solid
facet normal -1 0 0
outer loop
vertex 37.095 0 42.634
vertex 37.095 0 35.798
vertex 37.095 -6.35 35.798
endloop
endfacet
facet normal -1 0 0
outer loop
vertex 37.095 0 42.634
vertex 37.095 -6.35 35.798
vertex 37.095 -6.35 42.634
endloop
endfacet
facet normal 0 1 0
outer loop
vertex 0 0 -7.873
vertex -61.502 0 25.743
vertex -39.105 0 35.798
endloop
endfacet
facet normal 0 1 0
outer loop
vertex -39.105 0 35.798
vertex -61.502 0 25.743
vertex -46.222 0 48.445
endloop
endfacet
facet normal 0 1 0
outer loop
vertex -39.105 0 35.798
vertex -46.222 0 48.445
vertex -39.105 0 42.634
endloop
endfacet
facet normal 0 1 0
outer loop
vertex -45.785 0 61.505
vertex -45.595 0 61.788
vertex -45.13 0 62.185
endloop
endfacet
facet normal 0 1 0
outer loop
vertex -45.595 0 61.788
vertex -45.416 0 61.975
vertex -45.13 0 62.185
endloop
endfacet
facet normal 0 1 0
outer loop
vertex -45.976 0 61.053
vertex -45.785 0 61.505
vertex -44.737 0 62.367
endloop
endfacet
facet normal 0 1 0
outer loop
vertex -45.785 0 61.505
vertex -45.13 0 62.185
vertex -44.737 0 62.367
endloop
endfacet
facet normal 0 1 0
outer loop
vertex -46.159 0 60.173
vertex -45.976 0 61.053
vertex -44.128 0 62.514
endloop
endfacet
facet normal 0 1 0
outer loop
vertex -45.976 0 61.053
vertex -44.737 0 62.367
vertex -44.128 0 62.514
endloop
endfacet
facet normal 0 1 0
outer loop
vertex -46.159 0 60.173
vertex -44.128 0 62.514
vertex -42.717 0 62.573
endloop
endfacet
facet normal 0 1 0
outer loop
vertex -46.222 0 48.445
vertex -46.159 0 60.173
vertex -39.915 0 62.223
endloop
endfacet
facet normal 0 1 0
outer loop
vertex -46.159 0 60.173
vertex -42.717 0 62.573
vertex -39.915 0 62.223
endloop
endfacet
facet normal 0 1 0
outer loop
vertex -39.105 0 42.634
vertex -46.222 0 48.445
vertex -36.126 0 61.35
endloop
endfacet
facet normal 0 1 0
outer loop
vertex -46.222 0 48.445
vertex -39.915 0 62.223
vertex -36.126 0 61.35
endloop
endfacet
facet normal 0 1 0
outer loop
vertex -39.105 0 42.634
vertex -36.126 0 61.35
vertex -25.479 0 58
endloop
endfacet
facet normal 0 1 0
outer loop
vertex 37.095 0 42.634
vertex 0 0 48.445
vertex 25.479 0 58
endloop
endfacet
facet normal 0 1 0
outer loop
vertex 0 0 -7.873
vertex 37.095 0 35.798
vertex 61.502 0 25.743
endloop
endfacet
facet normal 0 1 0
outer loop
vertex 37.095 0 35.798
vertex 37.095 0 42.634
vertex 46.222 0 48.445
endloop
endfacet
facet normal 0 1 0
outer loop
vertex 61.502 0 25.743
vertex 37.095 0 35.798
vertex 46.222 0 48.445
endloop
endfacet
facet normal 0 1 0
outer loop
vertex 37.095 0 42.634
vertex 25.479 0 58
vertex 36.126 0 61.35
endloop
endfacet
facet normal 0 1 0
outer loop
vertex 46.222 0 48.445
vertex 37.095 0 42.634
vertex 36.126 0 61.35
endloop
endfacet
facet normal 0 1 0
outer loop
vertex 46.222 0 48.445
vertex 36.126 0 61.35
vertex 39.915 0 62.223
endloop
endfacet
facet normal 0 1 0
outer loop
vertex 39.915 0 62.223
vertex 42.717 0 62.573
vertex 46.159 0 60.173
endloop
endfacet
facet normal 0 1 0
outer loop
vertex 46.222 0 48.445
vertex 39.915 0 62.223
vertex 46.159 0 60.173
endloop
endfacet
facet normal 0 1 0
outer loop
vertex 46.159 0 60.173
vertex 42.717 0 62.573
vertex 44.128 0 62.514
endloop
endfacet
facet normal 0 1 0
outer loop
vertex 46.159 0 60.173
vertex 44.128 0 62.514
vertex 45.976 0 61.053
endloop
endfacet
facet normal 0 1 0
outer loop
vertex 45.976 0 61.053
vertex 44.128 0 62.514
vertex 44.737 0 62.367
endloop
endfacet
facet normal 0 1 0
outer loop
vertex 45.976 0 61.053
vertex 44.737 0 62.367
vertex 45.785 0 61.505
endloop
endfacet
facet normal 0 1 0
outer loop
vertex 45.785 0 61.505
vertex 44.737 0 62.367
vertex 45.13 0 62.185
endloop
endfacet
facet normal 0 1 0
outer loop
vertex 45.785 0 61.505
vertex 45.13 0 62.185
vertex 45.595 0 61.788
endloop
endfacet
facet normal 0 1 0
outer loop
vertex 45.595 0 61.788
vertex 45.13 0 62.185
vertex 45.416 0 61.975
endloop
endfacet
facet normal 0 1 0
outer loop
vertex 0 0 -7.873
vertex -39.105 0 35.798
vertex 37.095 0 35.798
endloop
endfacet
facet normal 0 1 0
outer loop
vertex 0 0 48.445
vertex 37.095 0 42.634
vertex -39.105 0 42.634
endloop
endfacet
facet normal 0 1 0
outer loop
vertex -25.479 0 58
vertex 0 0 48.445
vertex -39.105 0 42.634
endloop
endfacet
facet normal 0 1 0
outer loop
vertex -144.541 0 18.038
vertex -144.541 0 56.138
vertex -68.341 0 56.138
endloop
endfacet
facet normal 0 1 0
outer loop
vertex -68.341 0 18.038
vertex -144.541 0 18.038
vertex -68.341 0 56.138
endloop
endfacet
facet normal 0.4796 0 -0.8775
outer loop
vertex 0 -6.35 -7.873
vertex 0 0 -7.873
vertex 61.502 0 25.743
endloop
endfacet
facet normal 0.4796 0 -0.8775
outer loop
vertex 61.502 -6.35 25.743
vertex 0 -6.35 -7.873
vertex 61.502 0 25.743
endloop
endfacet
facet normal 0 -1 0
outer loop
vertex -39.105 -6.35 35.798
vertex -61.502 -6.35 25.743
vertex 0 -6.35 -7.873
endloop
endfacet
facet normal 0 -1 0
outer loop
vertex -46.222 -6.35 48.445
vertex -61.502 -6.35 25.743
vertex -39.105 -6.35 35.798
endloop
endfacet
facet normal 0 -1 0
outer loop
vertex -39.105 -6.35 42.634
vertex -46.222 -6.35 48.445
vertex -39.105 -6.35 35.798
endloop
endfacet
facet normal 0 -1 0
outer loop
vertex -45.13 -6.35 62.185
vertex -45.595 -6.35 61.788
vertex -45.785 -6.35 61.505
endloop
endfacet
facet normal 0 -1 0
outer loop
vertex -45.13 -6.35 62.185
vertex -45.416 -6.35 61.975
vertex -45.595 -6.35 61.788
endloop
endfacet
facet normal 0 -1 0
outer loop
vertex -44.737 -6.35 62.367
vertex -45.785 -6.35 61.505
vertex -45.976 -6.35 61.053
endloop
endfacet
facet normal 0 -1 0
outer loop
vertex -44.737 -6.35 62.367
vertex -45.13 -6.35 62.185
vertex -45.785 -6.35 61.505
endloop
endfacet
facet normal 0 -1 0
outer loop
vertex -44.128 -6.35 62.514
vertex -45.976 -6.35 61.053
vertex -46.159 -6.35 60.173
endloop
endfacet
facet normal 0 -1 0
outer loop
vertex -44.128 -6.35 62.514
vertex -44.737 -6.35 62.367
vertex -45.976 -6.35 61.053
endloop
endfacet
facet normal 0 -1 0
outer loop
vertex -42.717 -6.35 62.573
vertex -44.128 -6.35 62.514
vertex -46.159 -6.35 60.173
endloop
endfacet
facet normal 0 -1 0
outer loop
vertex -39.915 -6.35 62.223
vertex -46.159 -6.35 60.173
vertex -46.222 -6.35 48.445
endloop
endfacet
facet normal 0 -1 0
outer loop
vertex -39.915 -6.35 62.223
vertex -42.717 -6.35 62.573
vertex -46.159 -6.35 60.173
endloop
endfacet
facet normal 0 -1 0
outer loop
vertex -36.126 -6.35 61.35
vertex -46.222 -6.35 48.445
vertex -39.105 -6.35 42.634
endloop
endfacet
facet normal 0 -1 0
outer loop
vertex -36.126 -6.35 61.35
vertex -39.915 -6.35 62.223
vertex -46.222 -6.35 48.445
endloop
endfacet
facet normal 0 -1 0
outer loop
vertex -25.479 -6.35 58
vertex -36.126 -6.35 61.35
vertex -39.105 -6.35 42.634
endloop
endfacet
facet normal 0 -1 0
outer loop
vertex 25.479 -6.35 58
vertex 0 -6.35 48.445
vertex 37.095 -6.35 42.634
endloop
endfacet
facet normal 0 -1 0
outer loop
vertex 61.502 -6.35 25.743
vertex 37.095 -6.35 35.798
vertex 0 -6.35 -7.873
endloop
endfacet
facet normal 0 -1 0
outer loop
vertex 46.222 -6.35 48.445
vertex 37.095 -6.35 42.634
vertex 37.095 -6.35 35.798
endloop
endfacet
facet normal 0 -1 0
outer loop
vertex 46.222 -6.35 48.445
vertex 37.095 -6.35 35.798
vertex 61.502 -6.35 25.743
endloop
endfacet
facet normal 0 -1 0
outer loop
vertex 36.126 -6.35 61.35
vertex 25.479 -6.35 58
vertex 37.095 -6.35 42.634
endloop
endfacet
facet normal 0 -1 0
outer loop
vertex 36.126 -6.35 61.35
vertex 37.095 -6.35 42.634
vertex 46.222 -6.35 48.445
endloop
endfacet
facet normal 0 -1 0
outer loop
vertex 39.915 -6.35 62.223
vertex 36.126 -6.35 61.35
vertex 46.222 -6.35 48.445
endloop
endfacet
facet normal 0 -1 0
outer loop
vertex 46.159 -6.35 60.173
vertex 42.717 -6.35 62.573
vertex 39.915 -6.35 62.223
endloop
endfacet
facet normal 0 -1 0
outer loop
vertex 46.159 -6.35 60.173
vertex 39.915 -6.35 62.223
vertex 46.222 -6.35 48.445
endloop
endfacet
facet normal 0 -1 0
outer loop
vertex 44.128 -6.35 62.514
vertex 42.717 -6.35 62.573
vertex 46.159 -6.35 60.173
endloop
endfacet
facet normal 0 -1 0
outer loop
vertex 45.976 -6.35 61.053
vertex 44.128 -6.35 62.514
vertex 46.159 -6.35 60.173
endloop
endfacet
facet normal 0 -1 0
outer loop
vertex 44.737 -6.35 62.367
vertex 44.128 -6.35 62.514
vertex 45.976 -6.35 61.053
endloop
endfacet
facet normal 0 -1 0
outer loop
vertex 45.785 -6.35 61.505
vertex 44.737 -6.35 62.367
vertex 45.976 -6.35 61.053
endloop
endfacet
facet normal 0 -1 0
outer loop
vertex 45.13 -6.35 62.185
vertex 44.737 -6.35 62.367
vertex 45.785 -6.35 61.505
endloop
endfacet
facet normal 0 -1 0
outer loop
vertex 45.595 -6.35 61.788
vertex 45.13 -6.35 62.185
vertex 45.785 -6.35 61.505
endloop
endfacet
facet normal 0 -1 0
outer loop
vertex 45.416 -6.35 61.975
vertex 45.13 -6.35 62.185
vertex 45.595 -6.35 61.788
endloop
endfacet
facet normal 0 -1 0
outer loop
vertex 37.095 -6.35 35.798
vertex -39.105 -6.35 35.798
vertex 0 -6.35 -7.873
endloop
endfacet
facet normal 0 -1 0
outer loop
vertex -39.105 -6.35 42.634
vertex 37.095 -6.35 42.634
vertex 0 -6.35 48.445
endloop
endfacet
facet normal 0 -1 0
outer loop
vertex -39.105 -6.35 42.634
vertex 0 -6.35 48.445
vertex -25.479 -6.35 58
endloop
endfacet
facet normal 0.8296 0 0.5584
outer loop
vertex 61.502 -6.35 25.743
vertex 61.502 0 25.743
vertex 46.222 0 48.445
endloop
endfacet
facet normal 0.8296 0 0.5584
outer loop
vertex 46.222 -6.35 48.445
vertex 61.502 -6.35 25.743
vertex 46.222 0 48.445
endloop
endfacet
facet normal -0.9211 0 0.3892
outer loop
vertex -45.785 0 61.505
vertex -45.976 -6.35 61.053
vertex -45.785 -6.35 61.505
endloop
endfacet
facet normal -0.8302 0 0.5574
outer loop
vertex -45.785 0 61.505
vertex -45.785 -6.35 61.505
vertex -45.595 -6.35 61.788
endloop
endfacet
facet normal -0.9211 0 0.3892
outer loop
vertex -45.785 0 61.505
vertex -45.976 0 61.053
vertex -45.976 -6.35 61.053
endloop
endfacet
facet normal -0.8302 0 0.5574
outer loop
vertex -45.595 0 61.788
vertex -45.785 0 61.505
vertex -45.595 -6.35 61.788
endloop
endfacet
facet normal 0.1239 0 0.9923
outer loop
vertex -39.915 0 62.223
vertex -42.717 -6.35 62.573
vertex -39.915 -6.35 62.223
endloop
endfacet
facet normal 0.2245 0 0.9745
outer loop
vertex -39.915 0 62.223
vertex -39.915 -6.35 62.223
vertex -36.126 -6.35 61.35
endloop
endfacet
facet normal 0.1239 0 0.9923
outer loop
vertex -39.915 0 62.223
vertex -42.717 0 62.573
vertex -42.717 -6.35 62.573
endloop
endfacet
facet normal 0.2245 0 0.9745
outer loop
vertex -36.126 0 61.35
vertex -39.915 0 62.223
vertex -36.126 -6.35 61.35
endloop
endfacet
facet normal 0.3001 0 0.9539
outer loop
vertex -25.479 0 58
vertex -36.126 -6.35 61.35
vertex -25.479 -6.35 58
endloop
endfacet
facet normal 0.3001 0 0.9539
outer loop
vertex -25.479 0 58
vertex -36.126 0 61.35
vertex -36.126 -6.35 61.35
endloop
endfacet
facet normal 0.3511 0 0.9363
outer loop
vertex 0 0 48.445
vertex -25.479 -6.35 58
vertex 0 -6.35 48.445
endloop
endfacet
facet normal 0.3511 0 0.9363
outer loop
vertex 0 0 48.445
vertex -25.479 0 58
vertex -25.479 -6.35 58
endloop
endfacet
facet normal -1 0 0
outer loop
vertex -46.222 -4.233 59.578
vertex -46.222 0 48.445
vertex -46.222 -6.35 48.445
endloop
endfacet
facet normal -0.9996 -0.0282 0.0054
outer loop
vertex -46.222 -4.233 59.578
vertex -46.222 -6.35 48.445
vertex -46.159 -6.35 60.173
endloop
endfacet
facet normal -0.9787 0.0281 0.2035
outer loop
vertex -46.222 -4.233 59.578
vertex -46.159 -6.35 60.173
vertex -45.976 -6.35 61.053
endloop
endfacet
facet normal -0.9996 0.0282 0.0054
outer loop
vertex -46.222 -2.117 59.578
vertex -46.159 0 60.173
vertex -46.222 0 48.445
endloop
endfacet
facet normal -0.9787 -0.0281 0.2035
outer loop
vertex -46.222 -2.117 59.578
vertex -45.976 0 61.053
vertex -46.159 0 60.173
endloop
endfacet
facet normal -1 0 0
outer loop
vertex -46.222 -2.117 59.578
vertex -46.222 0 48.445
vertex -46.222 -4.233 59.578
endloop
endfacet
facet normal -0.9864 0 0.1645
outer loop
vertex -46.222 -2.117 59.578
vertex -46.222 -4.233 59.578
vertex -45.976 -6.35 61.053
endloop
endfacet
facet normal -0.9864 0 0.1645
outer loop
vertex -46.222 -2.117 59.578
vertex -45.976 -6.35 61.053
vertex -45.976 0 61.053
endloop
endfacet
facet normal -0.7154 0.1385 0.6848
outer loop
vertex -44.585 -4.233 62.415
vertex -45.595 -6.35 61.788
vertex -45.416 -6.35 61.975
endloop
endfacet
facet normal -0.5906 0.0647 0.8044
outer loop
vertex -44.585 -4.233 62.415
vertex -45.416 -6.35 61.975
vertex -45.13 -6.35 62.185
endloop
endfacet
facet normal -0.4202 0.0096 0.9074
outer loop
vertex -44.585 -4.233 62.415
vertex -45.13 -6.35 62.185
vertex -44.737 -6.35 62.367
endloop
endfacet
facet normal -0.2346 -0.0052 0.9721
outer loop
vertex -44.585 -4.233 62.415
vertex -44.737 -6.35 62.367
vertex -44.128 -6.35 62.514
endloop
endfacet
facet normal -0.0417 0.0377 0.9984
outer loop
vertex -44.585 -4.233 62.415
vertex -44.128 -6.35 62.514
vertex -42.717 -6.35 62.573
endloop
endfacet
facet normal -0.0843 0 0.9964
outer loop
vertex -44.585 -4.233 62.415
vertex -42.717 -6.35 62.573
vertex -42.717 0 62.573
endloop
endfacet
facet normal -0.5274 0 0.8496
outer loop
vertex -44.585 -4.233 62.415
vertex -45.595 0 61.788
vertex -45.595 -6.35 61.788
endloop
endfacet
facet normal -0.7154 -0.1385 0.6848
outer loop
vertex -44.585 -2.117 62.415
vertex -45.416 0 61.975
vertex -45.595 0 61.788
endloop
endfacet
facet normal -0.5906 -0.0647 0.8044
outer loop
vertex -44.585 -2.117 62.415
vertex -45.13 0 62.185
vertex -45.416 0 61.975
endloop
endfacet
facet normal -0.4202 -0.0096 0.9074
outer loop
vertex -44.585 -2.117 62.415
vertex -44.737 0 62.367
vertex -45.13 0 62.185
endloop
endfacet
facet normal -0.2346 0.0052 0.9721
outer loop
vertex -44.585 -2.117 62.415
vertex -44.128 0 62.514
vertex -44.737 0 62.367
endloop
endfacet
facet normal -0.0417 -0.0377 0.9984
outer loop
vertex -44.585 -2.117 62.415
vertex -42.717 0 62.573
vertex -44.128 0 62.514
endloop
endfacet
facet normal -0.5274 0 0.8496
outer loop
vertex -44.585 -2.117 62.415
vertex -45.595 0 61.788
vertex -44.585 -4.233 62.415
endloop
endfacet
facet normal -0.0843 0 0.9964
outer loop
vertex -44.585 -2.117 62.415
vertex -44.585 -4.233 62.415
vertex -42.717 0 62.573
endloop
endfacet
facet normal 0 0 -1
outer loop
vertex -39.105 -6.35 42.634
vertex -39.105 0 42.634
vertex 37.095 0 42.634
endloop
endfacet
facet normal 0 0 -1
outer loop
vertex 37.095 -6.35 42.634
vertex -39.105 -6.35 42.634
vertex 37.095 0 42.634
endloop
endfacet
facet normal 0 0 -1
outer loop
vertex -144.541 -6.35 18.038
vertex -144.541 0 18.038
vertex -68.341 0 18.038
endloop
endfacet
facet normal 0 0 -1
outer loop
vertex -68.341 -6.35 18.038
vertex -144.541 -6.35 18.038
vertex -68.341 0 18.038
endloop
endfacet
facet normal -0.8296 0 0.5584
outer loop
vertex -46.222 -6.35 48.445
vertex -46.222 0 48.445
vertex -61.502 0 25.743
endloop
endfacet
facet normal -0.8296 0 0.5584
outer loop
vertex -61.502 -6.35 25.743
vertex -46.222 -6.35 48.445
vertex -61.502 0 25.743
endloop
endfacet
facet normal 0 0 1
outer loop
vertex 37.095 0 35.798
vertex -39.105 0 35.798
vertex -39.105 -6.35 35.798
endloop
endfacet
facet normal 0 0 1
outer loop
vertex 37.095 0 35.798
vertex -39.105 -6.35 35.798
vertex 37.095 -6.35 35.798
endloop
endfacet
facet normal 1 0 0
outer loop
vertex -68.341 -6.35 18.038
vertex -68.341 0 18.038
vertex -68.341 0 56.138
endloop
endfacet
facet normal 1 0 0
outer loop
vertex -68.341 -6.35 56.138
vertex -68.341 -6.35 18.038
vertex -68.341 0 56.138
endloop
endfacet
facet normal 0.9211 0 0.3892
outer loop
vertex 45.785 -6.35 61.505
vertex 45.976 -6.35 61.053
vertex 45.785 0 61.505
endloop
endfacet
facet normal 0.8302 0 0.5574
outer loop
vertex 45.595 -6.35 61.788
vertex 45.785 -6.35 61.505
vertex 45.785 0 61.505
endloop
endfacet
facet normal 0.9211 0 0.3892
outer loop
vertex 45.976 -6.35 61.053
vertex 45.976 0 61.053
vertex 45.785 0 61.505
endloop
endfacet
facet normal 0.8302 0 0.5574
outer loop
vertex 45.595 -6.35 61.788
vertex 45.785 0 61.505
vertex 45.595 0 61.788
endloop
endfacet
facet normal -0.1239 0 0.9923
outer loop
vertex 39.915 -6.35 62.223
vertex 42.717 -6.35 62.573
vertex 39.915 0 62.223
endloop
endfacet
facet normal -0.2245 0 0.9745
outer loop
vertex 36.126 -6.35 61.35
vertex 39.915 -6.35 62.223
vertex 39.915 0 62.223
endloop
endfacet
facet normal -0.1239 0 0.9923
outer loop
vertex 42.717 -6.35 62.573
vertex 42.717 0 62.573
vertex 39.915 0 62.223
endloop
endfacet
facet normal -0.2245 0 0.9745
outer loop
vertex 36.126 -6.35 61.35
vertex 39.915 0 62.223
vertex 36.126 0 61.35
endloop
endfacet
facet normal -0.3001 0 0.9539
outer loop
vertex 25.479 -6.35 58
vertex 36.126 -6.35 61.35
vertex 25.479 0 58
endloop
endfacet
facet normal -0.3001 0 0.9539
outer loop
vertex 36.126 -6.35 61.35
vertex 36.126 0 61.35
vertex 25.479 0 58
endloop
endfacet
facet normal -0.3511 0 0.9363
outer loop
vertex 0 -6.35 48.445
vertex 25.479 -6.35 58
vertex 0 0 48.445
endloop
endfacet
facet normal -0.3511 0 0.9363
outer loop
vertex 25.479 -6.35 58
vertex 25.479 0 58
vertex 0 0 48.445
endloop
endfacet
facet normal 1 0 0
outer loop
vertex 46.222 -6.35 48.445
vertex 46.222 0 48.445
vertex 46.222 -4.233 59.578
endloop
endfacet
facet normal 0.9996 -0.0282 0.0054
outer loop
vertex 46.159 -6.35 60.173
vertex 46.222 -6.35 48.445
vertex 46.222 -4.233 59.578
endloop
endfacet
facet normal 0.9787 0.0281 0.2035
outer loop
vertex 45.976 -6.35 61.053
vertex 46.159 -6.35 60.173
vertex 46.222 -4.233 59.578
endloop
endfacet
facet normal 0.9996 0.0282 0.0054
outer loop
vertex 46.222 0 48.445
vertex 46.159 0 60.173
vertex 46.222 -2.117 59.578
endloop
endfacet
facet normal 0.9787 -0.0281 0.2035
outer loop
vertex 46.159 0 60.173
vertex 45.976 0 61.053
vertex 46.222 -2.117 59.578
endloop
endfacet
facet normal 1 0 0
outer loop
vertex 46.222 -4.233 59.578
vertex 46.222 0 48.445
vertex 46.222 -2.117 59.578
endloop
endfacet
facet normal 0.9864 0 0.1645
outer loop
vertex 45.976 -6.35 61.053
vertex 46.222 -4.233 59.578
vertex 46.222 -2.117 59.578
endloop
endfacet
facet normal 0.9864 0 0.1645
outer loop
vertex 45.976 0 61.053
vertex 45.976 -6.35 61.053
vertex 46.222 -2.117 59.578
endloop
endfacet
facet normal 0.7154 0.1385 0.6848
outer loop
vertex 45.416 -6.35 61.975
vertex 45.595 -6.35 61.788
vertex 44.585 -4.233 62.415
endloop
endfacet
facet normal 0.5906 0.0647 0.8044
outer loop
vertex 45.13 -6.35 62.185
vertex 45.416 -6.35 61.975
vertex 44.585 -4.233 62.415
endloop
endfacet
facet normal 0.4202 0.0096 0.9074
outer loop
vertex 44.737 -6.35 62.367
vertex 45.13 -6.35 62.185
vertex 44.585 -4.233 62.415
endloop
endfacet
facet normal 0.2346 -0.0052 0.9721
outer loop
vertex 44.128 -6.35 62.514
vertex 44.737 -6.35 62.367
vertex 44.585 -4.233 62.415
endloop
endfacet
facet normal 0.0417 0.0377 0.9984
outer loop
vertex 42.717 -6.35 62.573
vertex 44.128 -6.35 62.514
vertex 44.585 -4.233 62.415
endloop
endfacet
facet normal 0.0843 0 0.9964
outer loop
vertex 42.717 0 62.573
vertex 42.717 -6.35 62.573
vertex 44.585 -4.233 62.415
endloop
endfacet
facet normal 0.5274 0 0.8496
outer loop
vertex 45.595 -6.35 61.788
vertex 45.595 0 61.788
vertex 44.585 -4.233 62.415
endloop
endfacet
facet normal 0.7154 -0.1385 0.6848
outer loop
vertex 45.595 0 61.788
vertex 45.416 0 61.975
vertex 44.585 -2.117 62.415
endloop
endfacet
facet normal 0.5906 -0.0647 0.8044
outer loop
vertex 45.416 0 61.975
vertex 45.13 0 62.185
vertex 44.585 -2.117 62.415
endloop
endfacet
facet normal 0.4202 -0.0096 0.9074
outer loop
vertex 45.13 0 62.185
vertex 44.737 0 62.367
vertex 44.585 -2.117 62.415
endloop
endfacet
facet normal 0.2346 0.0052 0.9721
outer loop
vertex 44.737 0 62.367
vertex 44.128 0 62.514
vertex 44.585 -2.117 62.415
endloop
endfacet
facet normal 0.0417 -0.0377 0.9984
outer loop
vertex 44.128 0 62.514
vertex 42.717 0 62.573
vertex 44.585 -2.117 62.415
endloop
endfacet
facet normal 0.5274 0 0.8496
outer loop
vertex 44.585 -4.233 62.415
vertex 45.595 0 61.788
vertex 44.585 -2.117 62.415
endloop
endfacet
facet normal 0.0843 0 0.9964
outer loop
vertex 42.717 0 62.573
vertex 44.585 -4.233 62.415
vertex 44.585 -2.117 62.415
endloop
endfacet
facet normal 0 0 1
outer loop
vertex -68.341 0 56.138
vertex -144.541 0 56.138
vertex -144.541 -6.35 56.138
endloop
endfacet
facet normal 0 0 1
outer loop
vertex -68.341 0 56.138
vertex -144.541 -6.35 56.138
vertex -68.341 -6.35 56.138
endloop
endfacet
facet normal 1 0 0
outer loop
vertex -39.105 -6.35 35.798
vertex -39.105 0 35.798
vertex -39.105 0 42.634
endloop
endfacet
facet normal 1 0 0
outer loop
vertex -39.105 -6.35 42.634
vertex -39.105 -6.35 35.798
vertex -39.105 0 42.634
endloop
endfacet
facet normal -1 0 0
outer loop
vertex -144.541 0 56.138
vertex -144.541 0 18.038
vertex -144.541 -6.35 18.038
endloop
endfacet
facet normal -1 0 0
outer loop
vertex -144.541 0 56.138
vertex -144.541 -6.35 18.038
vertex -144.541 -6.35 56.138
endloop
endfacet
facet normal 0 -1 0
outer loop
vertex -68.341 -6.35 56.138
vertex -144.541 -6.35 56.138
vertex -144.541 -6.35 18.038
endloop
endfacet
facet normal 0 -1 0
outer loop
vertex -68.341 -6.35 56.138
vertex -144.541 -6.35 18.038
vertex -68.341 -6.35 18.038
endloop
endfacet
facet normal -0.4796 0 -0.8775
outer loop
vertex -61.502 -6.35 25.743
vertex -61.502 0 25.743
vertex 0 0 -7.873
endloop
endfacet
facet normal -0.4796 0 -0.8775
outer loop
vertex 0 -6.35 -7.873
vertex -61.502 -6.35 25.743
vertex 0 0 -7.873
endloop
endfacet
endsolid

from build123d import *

# Parameters (mm, degrees)
F0_W     = 76.2
F0_H     = 6.8358847338
F1_DEPTH = 6.35
F0_H_2   = 38.1


with BuildPart() as f1:
    # F0 (on Front) → F1 (new body)
    with BuildSketch(Plane.XZ):
        with BuildLine():
            add(Edge.make_bspline(
                [(46.2221666575, 48.4449205091), (46.3383978199, 52.6665628684), (46.5176823791, 59.1783732528), (45.0035869892, 65.8508295622), (19.8708681973, 56.1303195581), (0, 48.4449205091)],
                knots=[0, 0, 0, 0, 0.2784649622, 0.429527392, 1, 1, 1, 1], degree=3))
            Line((0, 48.4449205091), (46.2221666575, 48.4449205091))
        make_face()
        Polygon((46.2221666575, 48.4449205091), (0, 48.4449205091), (-46.2221666575, 48.4449205091), (-61.5021972923, 25.7431598613), (0, -7.8729035217), (61.5021972923, 25.7431598613), align=None)
        with Locations((-1.0052731635, 39.215762071)):
            Rectangle(F0_W, F0_H, mode=Mode.SUBTRACT)
        with BuildLine():
            Line((-46.2221666575, 48.4449205091), (0, 48.4449205091))
            add(Edge.make_bspline(
                [(-46.2221666575, 48.4449205091), (-46.3383978199, 52.6665628684), (-46.5176823791, 59.1783732528), (-45.0035869892, 65.8508295622), (-19.8708681973, 56.1303195581), (0, 48.4449205091)],
                knots=[0, 0, 0, 0, 0.2784649622, 0.429527392, 1, 1, 1, 1], degree=3))
        make_face()
    extrude(amount=F1_DEPTH)


with BuildPart() as f1b:
    # F0 (on Front) → F1, piece 2 (new body)
    with BuildSketch(Plane.XZ):
        with Locations((-106.4413082838, 37.0880530655)):
            Rectangle(F0_W, F0_H_2)
    extrude(amount=F1_DEPTH)


solid = Compound([f1.part, f1b.part])
